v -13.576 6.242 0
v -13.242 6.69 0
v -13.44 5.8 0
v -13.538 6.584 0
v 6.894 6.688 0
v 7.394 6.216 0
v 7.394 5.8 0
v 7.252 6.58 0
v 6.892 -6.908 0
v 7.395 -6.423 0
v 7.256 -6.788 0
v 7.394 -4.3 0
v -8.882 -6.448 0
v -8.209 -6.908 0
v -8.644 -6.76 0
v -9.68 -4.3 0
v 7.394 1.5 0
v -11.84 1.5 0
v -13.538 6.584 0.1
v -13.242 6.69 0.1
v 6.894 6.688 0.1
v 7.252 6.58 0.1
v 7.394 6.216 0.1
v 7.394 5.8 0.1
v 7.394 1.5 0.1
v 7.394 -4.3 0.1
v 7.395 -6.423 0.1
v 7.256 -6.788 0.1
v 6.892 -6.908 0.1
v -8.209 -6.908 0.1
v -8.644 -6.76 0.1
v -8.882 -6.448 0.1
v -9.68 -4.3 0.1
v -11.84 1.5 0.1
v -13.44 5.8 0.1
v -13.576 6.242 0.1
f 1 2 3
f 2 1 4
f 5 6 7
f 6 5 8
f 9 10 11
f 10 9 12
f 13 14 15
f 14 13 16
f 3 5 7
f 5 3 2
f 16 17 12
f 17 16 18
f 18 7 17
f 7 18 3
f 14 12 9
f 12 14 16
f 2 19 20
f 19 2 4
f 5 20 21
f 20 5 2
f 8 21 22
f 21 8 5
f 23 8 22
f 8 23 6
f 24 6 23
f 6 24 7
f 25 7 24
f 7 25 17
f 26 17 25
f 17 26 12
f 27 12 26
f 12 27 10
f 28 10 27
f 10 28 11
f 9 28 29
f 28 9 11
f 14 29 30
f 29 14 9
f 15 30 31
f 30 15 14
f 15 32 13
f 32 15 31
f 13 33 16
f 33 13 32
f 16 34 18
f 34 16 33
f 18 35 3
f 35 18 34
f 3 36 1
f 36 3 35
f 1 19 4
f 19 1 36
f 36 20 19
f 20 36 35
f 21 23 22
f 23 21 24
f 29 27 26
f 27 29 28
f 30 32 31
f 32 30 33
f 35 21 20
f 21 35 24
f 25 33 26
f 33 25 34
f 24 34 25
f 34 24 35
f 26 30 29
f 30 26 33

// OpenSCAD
// file: ../p/4-4edge.scad
use <../lib.scad>
$fa=1; $fs=0.2;
function ldraw_lib__4_4edge(realsolid=false) = [
// 0 Circle 1.0
// 0 Name: 4-4edge.dat
// 0 Author: James Jessiman
// 0 !LDRAW_ORG Primitive UPDATE 2017-01
// 0 !LICENSE Licensed under CC BY 2.0 and CC BY 4.0 : see CAreadme.txt
// 
// 0 BFC CERTIFY CCW
  [0,"BFC","CERTIFY"],
  [0,"BFC","CCW"],
// 
// 0 !HISTORY 1998-12-15 [PTadmin] Official Update 1998-10
// 0 !HISTORY 2005-12-28 [PTadmin] Official Update 2005-01
// 0 !HISTORY 2007-06-24 [PTadmin] Header formatted for Contributor Agreement
// 0 !HISTORY 2008-07-01 [PTadmin] Official Update 2008-01
// 0 !HISTORY 2017-01-15 [Steffen] BFCed
// 0 !HISTORY 2017-12-30 [PTadmin] Official Update 2017-01
// 
// 
// 2 24 1 0 0 0.9239 0 0.3827
  [2,24,1,0,0,0.9239,0,0.3827],
// 2 24 0.9239 0 0.3827 0.7071 0 0.7071
  [2,24,0.9239,0,0.3827,0.7071,0,0.7071],
// 2 24 0.7071 0 0.7071 0.3827 0 0.9239
  [2,24,0.7071,0,0.7071,0.3827,0,0.9239],
// 2 24 0.3827 0 0.9239 0 0 1
  [2,24,0.3827,0,0.9239,0,0,1],
// 2 24 0 0 1 -0.3827 0 0.9239
  [2,24,0,0,1,-0.3827,0,0.9239],
// 2 24 -0.3827 0 0.9239 -0.7071 0 0.7071
  [2,24,-0.3827,0,0.9239,-0.7071,0,0.7071],
// 2 24 -0.7071 0 0.7071 -0.9239 0 0.3827
  [2,24,-0.7071,0,0.7071,-0.9239,0,0.3827],
// 2 24 -0.9239 0 0.3827 -1 0 -0
  [2,24,-0.9239,0,0.3827,-1,0,-0],
// 2 24 -1 0 -0 -0.9239 0 -0.3827
  [2,24,-1,0,-0,-0.9239,0,-0.3827],
// 2 24 -0.9239 0 -0.3827 -0.7071 0 -0.7071
  [2,24,-0.9239,0,-0.3827,-0.7071,0,-0.7071],
// 2 24 -0.7071 0 -0.7071 -0.3827 0 -0.9239
  [2,24,-0.7071,0,-0.7071,-0.3827,0,-0.9239],
// 2 24 -0.3827 0 -0.9239 0 0 -1
  [2,24,-0.3827,0,-0.9239,0,0,-1],
// 2 24 0 0 -1 0.3827 0 -0.9239
  [2,24,0,0,-1,0.3827,0,-0.9239],
// 2 24 0.3827 0 -0.9239 0.7071 0 -0.7071
  [2,24,0.3827,0,-0.9239,0.7071,0,-0.7071],
// 2 24 0.7071 0 -0.7071 0.9239 0 -0.3827
  [2,24,0.7071,0,-0.7071,0.9239,0,-0.3827],
// 2 24 0.9239 0 -0.3827 1 0 0
  [2,24,0.9239,0,-0.3827,1,0,0],
];
module ldraw_lib__4_4edge(step=0, col=false, unit=2/5, alt=false, line=0.2, solid=!$preview)
    makepoly(ldraw_lib__4_4edge(solid), step=step, col=col, unit=unit, alt=alt, line=line, solid=solid);
ldraw_lib__4_4edge(line=0.2);
// file: ../p/4-4disc.scad
use <../lib.scad>
$fa=1; $fs=0.2;
function ldraw_lib__4_4disc(realsolid=false) = [
// 0 Disc 1.0
// 0 Name: 4-4disc.dat
// 0 Author: James Jessiman
// 0 !LDRAW_ORG Primitive UPDATE 2002-02
// 0 !LICENSE Licensed under CC BY 2.0 and CC BY 4.0 : see CAreadme.txt
// 
// 0 BFC CERTIFY CCW
  [0,"BFC","CERTIFY"],
  [0,"BFC","CCW"],
// 
// 0 !HISTORY 1998-12-15 [PTadmin] Official Update 1998-10
// 0 !HISTORY 2002-03-23 [sbliss] Added BFC statement
// 0 !HISTORY 2002-04-25 [PTadmin] Official Update 2002-02
// 0 !HISTORY 2007-06-24 [PTadmin] Header formatted for Contributor Agreement
// 0 !HISTORY 2008-07-01 [PTadmin] Official Update 2008-01
// 
// 
// 3 16 0 0 0 1 0 0 0.9239 0 0.3827
  [3,16,0,0,0,1,0,0,0.9239,0,0.3827],
// 3 16 0 0 0 0.9239 0 0.3827 0.7071 0 0.7071
  [3,16,0,0,0,0.9239,0,0.3827,0.7071,0,0.7071],
// 3 16 0 0 0 0.7071 0 0.7071 0.3827 0 0.9239
  [3,16,0,0,0,0.7071,0,0.7071,0.3827,0,0.9239],
// 3 16 0 0 0 0.3827 0 0.9239 0 0 1
  [3,16,0,0,0,0.3827,0,0.9239,0,0,1],
// 3 16 0 0 0 0 0 1 -0.3827 0 0.9239
  [3,16,0,0,0,0,0,1,-0.3827,0,0.9239],
// 3 16 0 0 0 -0.3827 0 0.9239 -0.7071 0 0.7071
  [3,16,0,0,0,-0.3827,0,0.9239,-0.7071,0,0.7071],
// 3 16 0 0 0 -0.7071 0 0.7071 -0.9239 0 0.3827
  [3,16,0,0,0,-0.7071,0,0.7071,-0.9239,0,0.3827],
// 3 16 0 0 0 -0.9239 0 0.3827 -1 0 -0
  [3,16,0,0,0,-0.9239,0,0.3827,-1,0,-0],
// 3 16 0 0 0 -1 0 -0 -0.9239 0 -0.3827
  [3,16,0,0,0,-1,0,-0,-0.9239,0,-0.3827],
// 3 16 0 0 0 -0.9239 0 -0.3827 -0.7071 0 -0.7071
  [3,16,0,0,0,-0.9239,0,-0.3827,-0.7071,0,-0.7071],
// 3 16 0 0 0 -0.7071 0 -0.7071 -0.3827 0 -0.9239
  [3,16,0,0,0,-0.7071,0,-0.7071,-0.3827,0,-0.9239],
// 3 16 0 0 0 -0.3827 0 -0.9239 0 0 -1
  [3,16,0,0,0,-0.3827,0,-0.9239,0,0,-1],
// 3 16 0 0 0 0 0 -1 0.3827 0 -0.9239
  [3,16,0,0,0,0,0,-1,0.3827,0,-0.9239],
// 3 16 0 0 0 0.3827 0 -0.9239 0.7071 0 -0.7071
  [3,16,0,0,0,0.3827,0,-0.9239,0.7071,0,-0.7071],
// 3 16 0 0 0 0.7071 0 -0.7071 0.9239 0 -0.3827
  [3,16,0,0,0,0.7071,0,-0.7071,0.9239,0,-0.3827],
// 3 16 0 0 0 0.9239 0 -0.3827 1 0 0
  [3,16,0,0,0,0.9239,0,-0.3827,1,0,0],
// 0
];
module ldraw_lib__4_4disc(step=0, col=false, unit=2/5, alt=false, line=0.2, solid=!$preview)
    makepoly(ldraw_lib__4_4disc(solid), step=step, col=col, unit=unit, alt=alt, line=line, solid=solid);
ldraw_lib__4_4disc(line=0.2);
// file: ../p/4-4cyli.scad
use <../lib.scad>
$fa=1; $fs=0.2;
function ldraw_lib__4_4cyli(realsolid=false) = [
// 0 Cylinder 1.0
// 0 Name: 4-4cyli.dat
// 0 Author: James Jessiman
// 0 !LDRAW_ORG Primitive UPDATE 2005-01
// 0 !LICENSE Licensed under CC BY 2.0 and CC BY 4.0 : see CAreadme.txt
// 
// 0 BFC CERTIFY CCW
  [0,"BFC","CERTIFY"],
  [0,"BFC","CCW"],
// 
// 0 !HISTORY 1998-12-15 [PTadmin] Official Update 1998-10
// 0 !HISTORY 2002-03-23 [sbliss] Added BFC statement; merged headers from files in distributions LDraw 0.27 and Complete.
// 0 !HISTORY 2002-04-25 [PTadmin] Official Update 2002-02
// 0 !HISTORY 2004-12-14 [guyvivan] BFC CCW
// 0 !HISTORY 2005-12-28 [PTadmin] Official Update 2005-01
// 0 !HISTORY 2007-06-24 [PTadmin] Header formatted for Contributor Agreement
// 0 !HISTORY 2008-07-01 [PTadmin] Official Update 2008-01
// 
// 
// 4 16 1 1 0 0.9239 1 0.3827 0.9239 0 0.3827 1 0 0
  [4,16,1,1,0,0.9239,1,0.3827,0.9239,0,0.3827,1,0,0],
// 5 24 1 0 0 1 1 0 0.9239 0 0.3827 0.9239 0 -0.3827
  [5,24,1,0,0,1,1,0,0.9239,0,0.3827,0.9239,0,-0.3827],
// 4 16 0.9239 1 0.3827 0.7071 1 0.7071 0.7071 0 0.7071 0.9239 0 0.3827
  [4,16,0.9239,1,0.3827,0.7071,1,0.7071,0.7071,0,0.7071,0.9239,0,0.3827],
// 5 24 0.9239 0 0.3827 0.9239 1 0.3827 0.7071 0 0.7071 1 0 0
  [5,24,0.9239,0,0.3827,0.9239,1,0.3827,0.7071,0,0.7071,1,0,0],
// 4 16 0.7071 1 0.7071 0.3827 1 0.9239 0.3827 0 0.9239 0.7071 0 0.7071
  [4,16,0.7071,1,0.7071,0.3827,1,0.9239,0.3827,0,0.9239,0.7071,0,0.7071],
// 5 24 0.7071 0 0.7071 0.7071 1 0.7071 0.3827 0 0.9239 0.9239 0 0.3827
  [5,24,0.7071,0,0.7071,0.7071,1,0.7071,0.3827,0,0.9239,0.9239,0,0.3827],
// 4 16 0.3827 1 0.9239 0 1 1 0 0 1 0.3827 0 0.9239
  [4,16,0.3827,1,0.9239,0,1,1,0,0,1,0.3827,0,0.9239],
// 5 24 0.3827 0 0.9239 0.3827 1 0.9239 0 0 1 0.7071 0 0.7071
  [5,24,0.3827,0,0.9239,0.3827,1,0.9239,0,0,1,0.7071,0,0.7071],
// 4 16 0 1 1 -0.3827 1 0.9239 -0.3827 0 0.9239 0 0 1
  [4,16,0,1,1,-0.3827,1,0.9239,-0.3827,0,0.9239,0,0,1],
// 5 24 0 0 1 0 1 1 -0.3827 0 0.9239 0.3827 0 0.9239
  [5,24,0,0,1,0,1,1,-0.3827,0,0.9239,0.3827,0,0.9239],
// 4 16 -0.3827 1 0.9239 -0.7071 1 0.7071 -0.7071 0 0.7071 -0.3827 0 0.9239
  [4,16,-0.3827,1,0.9239,-0.7071,1,0.7071,-0.7071,0,0.7071,-0.3827,0,0.9239],
// 5 24 -0.3827 0 0.9239 -0.3827 1 0.9239 -0.7071 0 0.7071 0 0 1
  [5,24,-0.3827,0,0.9239,-0.3827,1,0.9239,-0.7071,0,0.7071,0,0,1],
// 4 16 -0.7071 1 0.7071 -0.9239 1 0.3827 -0.9239 0 0.3827 -0.7071 0 0.7071
  [4,16,-0.7071,1,0.7071,-0.9239,1,0.3827,-0.9239,0,0.3827,-0.7071,0,0.7071],
// 5 24 -0.7071 0 0.7071 -0.7071 1 0.7071 -0.9239 0 0.3827 -0.3827 0 0.9239
  [5,24,-0.7071,0,0.7071,-0.7071,1,0.7071,-0.9239,0,0.3827,-0.3827,0,0.9239],
// 4 16 -0.9239 1 0.3827 -1 1 0 -1 0 0 -0.9239 0 0.3827
  [4,16,-0.9239,1,0.3827,-1,1,0,-1,0,0,-0.9239,0,0.3827],
// 5 24 -0.9239 0 0.3827 -0.9239 1 0.3827 -1 0 0 -0.7071 0 0.7071
  [5,24,-0.9239,0,0.3827,-0.9239,1,0.3827,-1,0,0,-0.7071,0,0.7071],
// 4 16 -1 1 0 -0.9239 1 -0.3827 -0.9239 0 -0.3827 -1 0 0
  [4,16,-1,1,0,-0.9239,1,-0.3827,-0.9239,0,-0.3827,-1,0,0],
// 5 24 -1 0 0 -1 1 0 -0.9239 0 -0.3827 -0.9239 0 0.3827
  [5,24,-1,0,0,-1,1,0,-0.9239,0,-0.3827,-0.9239,0,0.3827],
// 4 16 -0.9239 1 -0.3827 -0.7071 1 -0.7071 -0.7071 0 -0.7071 -0.9239 0 -0.3827
  [4,16,-0.9239,1,-0.3827,-0.7071,1,-0.7071,-0.7071,0,-0.7071,-0.9239,0,-0.3827],
// 5 24 -0.9239 0 -0.3827 -0.9239 1 -0.3827 -0.7071 0 -0.7071 -1 0 0
  [5,24,-0.9239,0,-0.3827,-0.9239,1,-0.3827,-0.7071,0,-0.7071,-1,0,0],
// 4 16 -0.7071 1 -0.7071 -0.3827 1 -0.9239 -0.3827 0 -0.9239 -0.7071 0 -0.7071
  [4,16,-0.7071,1,-0.7071,-0.3827,1,-0.9239,-0.3827,0,-0.9239,-0.7071,0,-0.7071],
// 5 24 -0.7071 0 -0.7071 -0.7071 1 -0.7071 -0.3827 0 -0.9239 -0.9239 0 -0.3827
  [5,24,-0.7071,0,-0.7071,-0.7071,1,-0.7071,-0.3827,0,-0.9239,-0.9239,0,-0.3827],
// 4 16 -0.3827 1 -0.9239 0 1 -1 0 0 -1 -0.3827 0 -0.9239
  [4,16,-0.3827,1,-0.9239,0,1,-1,0,0,-1,-0.3827,0,-0.9239],
// 5 24 -0.3827 0 -0.9239 -0.3827 1 -0.9239 0 0 -1 -0.7071 0 -0.7071
  [5,24,-0.3827,0,-0.9239,-0.3827,1,-0.9239,0,0,-1,-0.7071,0,-0.7071],
// 4 16 0 1 -1 0.3827 1 -0.9239 0.3827 0 -0.9239 0 0 -1
  [4,16,0,1,-1,0.3827,1,-0.9239,0.3827,0,-0.9239,0,0,-1],
// 5 24 0 0 -1 0 1 -1 0.3827 0 -0.9239 -0.3827 0 -0.9239
  [5,24,0,0,-1,0,1,-1,0.3827,0,-0.9239,-0.3827,0,-0.9239],
// 4 16 0.3827 1 -0.9239 0.7071 1 -0.7071 0.7071 0 -0.7071 0.3827 0 -0.9239
  [4,16,0.3827,1,-0.9239,0.7071,1,-0.7071,0.7071,0,-0.7071,0.3827,0,-0.9239],
// 5 24 0.3827 0 -0.9239 0.3827 1 -0.9239 0.7071 0 -0.7071 0 0 -1
  [5,24,0.3827,0,-0.9239,0.3827,1,-0.9239,0.7071,0,-0.7071,0,0,-1],
// 4 16 0.7071 1 -0.7071 0.9239 1 -0.3827 0.9239 0 -0.3827 0.7071 0 -0.7071
  [4,16,0.7071,1,-0.7071,0.9239,1,-0.3827,0.9239,0,-0.3827,0.7071,0,-0.7071],
// 5 24 0.7071 0 -0.7071 0.7071 1 -0.7071 0.9239 0 -0.3827 0.3827 0 -0.9239
  [5,24,0.7071,0,-0.7071,0.7071,1,-0.7071,0.9239,0,-0.3827,0.3827,0,-0.9239],
// 4 16 0.9239 1 -0.3827 1 1 0 1 0 0 0.9239 0 -0.3827
  [4,16,0.9239,1,-0.3827,1,1,0,1,0,0,0.9239,0,-0.3827],
// 5 24 0.9239 0 -0.3827 0.9239 1 -0.3827 1 0 0 0.7071 0 -0.7071
  [5,24,0.9239,0,-0.3827,0.9239,1,-0.3827,1,0,0,0.7071,0,-0.7071],
// 0
];
module ldraw_lib__4_4cyli(step=0, col=false, unit=2/5, alt=false, line=0.2, solid=!$preview)
    makepoly(ldraw_lib__4_4cyli(solid), step=step, col=col, unit=unit, alt=alt, line=line, solid=solid);
ldraw_lib__4_4cyli(line=0.2);
// file: ../p/stud3.scad
use <../lib.scad>
use <4-4cyli.scad>
use <4-4disc.scad>
use <4-4edge.scad>
$fa=1; $fs=0.2;
function ldraw_lib__stud3(realsolid=false) = realsolid ? 
    [openscad(translate([0,0,-eps()], o=cylinder(4+eps(), r=4)),2)] : [
// 0 Stud Tube Solid
// 0 Name: stud3.dat
// 0 Author: James Jessiman
// 0 !LDRAW_ORG Primitive UPDATE 2012-01
// 0 !LICENSE Licensed under CC BY 2.0 and CC BY 4.0 : see CAreadme.txt
// 
// 0 BFC CERTIFY CCW
  [0,"BFC","CERTIFY"],
  [0,"BFC","CCW"],
// 
// 0 !HISTORY 2002-04-04 [sbliss] Modified for BFC compliance
// 0 !HISTORY 2002-04-25 [PTadmin] Official Update 2002-02
// 0 !HISTORY 2007-06-24 [PTadmin] Header formatted for Contributor Agreement
// 0 !HISTORY 2008-07-01 [PTadmin] Official Update 2008-01
// 0 !HISTORY 2012-02-16 [Philo] Changed to CCW
// 0 !HISTORY 2012-03-30 [PTadmin] Official Update 2012-01
// 
// 
// 1 16 0 -4 0 4 0 0 0 1 0 0 0 4 4-4edge.dat
  [1,16,0,-4,0,4,0,0,0,1,0,0,0,4, ldraw_lib__4_4edge(realsolid)],
// 1 16 0 0 0 4 0 0 0 1 0 0 0 4 4-4edge.dat
  [1,16,0,0,0,4,0,0,0,1,0,0,0,4, ldraw_lib__4_4edge(realsolid)],
// 1 16 0 -4 0 4 0 0 0 1 0 0 0 4 4-4disc.dat
  [1,16,0,-4,0,4,0,0,0,1,0,0,0,4, ldraw_lib__4_4disc(realsolid)],
// 1 16 0 -4 0 4 0 0 0 4 0 0 0 4 4-4cyli.dat
  [1,16,0,-4,0,4,0,0,0,4,0,0,0,4, ldraw_lib__4_4cyli(realsolid)],
];
module ldraw_lib__stud3(step=0, col=false, unit=2/5, alt=false, line=0.2, solid=!$preview)
    makepoly(ldraw_lib__stud3(solid), step=step, col=col, unit=unit, alt=alt, line=line, solid=solid);
ldraw_lib__stud3(line=0.2);
// file: ../p/stud.scad
use <../lib.scad>
use <4-4cyli.scad>
use <4-4disc.scad>
use <4-4edge.scad>
$fa=1; $fs=0.2;
function ldraw_lib__stud(realsolid=false) = realsolid ? 
    [openscad(translate([0,0,-eps()], o=cylinder(4+eps(), r=6)),2)] : [
// 0 Stud
// 0 Name: stud.dat
// 0 Author: James Jessiman
// 0 !LDRAW_ORG Primitive UPDATE 2012-01
// 0 !LICENSE Licensed under CC BY 2.0 and CC BY 4.0 : see CAreadme.txt
// 
// 0 BFC CERTIFY CCW
  [0,"BFC","CERTIFY"],
  [0,"BFC","CCW"],
// 
// 0 !HISTORY 2002-04-04 [sbliss] Modified for BFC compliance
// 0 !HISTORY 2002-04-25 [PTadmin] Official Update 2002-02
// 0 !HISTORY 2007-06-24 [PTadmin] Header formatted for Contributor Agreement
// 0 !HISTORY 2008-07-01 [PTadmin] Official Update 2008-01
// 0 !HISTORY 2012-02-16 [Philo] Changed to CCW
// 0 !HISTORY 2012-03-30 [PTadmin] Official Update 2012-01
// 
// 
// 1 16 0 0 0 6 0 0 0 1 0 0 0 6 4-4edge.dat
  [1,16,0,0,0,6,0,0,0,1,0,0,0,6, ldraw_lib__4_4edge(realsolid)],
// 1 16 0 -4 0 6 0 0 0 1 0 0 0 6 4-4edge.dat
  [1,16,0,-4,0,6,0,0,0,1,0,0,0,6, ldraw_lib__4_4edge(realsolid)],
// 1 16 0 0 0 6 0 0 0 -4 0 0 0 6 4-4cyli.dat
  [1,16,0,0,0,6,0,0,0,-4,0,0,0,6, ldraw_lib__4_4cyli(realsolid)],
// 1 16 0 -4 0 6 0 0 0 1 0 0 0 6 4-4disc.dat
  [1,16,0,-4,0,6,0,0,0,1,0,0,0,6, ldraw_lib__4_4disc(realsolid)],
];
module ldraw_lib__stud(step=0, col=false, unit=2/5, alt=false, line=0.2, solid=!$preview)
    makepoly(ldraw_lib__stud(solid), step=step, col=col, unit=unit, alt=alt, line=line, solid=solid);
ldraw_lib__stud(line=0.2);
// file: ../p/box5.scad
use <../lib.scad>
$fa=1; $fs=0.2;
function ldraw_lib__box5(realsolid=false) = [
// 0 Box with 5 Faces and All Edges
// 0 Name: box5.dat
// 0 Author: James Jessiman
// 0 !LDRAW_ORG Primitive UPDATE 2012-01
// 0 !LICENSE Licensed under CC BY 2.0 and CC BY 4.0 : see CAreadme.txt
// 
// 0 BFC CERTIFY CCW
  [0,"BFC","CERTIFY"],
  [0,"BFC","CCW"],
// 
// 0 !HISTORY 2002-04-03 [sbliss] Modified for BFC compliance
// 0 !HISTORY 2002-04-25 [PTadmin] Official Update 2002-02
// 0 !HISTORY 2007-06-24 [PTadmin] Header formatted for Contributor Agreement
// 0 !HISTORY 2008-07-01 [PTadmin] Official Update 2008-01
// 0 !HISTORY 2012-02-16 [Philo] Changed to CCW
// 0 !HISTORY 2012-03-30 [PTadmin] Official Update 2012-01
// 
// 
// 2 24 1 1 1 -1 1 1
  [2,24,1,1,1,-1,1,1],
// 2 24 -1 1 1 -1 1 -1
  [2,24,-1,1,1,-1,1,-1],
// 2 24 -1 1 -1 1 1 -1
  [2,24,-1,1,-1,1,1,-1],
// 2 24 1 1 -1 1 1 1
  [2,24,1,1,-1,1,1,1],
// 2 24 1 0 1 -1 0 1
  [2,24,1,0,1,-1,0,1],
// 2 24 -1 0 1 -1 0 -1
  [2,24,-1,0,1,-1,0,-1],
// 2 24 -1 0 -1 1 0 -1
  [2,24,-1,0,-1,1,0,-1],
// 2 24 1 0 -1 1 0 1
  [2,24,1,0,-1,1,0,1],
// 2 24 1 0 1 1 1 1
  [2,24,1,0,1,1,1,1],
// 2 24 -1 0 1 -1 1 1
  [2,24,-1,0,1,-1,1,1],
// 2 24 1 0 -1 1 1 -1
  [2,24,1,0,-1,1,1,-1],
// 2 24 -1 0 -1 -1 1 -1
  [2,24,-1,0,-1,-1,1,-1],
// 4 16 -1 1 1 1 1 1 1 1 -1 -1 1 -1
  [4,16,-1,1,1,1,1,1,1,1,-1,-1,1,-1],
// 4 16 -1 1 1 -1 0 1 1 0 1 1 1 1
  [4,16,-1,1,1,-1,0,1,1,0,1,1,1,1],
// 4 16 -1 1 -1 -1 0 -1 -1 0 1 -1 1 1
  [4,16,-1,1,-1,-1,0,-1,-1,0,1,-1,1,1],
// 4 16 1 1 -1 1 0 -1 -1 0 -1 -1 1 -1
  [4,16,1,1,-1,1,0,-1,-1,0,-1,-1,1,-1],
// 4 16 1 1 1 1 0 1 1 0 -1 1 1 -1
  [4,16,1,1,1,1,0,1,1,0,-1,1,1,-1],
];
module ldraw_lib__box5(step=0, col=false, unit=2/5, alt=false, line=0.2, solid=!$preview)
    makepoly(ldraw_lib__box5(solid), step=step, col=col, unit=unit, alt=alt, line=line, solid=solid);
ldraw_lib__box5(line=0.2);
// file: ../p/box4t.scad
use <../lib.scad>
$fa=1; $fs=0.2;
function ldraw_lib__box4t(realsolid=false) = [
// 0 Box with 4 Adjacent Faces and All Edges
// 0 Name: box4t.dat
// 0 Author: Tore Eriksson [Tore_Eriksson]
// 0 !LDRAW_ORG Primitive UPDATE 2003-02
// 0 !LICENSE Licensed under CC BY 2.0 and CC BY 4.0 : see CAreadme.txt
// 
// 0 BFC CERTIFY CCW
  [0,"BFC","CERTIFY"],
  [0,"BFC","CCW"],
// 
// 0 !HISTORY 1997-09-29 [PTadmin] Official Update 1997-15
// 0 !HISTORY 2002-08-31 [izanette] Modified with WINDZ for BFC compliance
// 0 !HISTORY 2003-08-01 [PTadmin] Official Update 2003-02
// 0 !HISTORY 2007-06-24 [PTadmin] Header formatted for Contributor Agreement
// 0 !HISTORY 2008-07-01 [PTadmin] Official Update 2008-01
// 
// 
// 2 24 1 1 1 -1 1 1
  [2,24,1,1,1,-1,1,1],
// 2 24 -1 1 1 -1 1 -1
  [2,24,-1,1,1,-1,1,-1],
// 2 24 -1 1 -1 1 1 -1
  [2,24,-1,1,-1,1,1,-1],
// 2 24 1 1 -1 1 1 1
  [2,24,1,1,-1,1,1,1],
// 2 24 1 0 1 -1 0 1
  [2,24,1,0,1,-1,0,1],
// 2 24 -1 0 1 -1 0 -1
  [2,24,-1,0,1,-1,0,-1],
// 2 24 -1 0 -1 1 0 -1
  [2,24,-1,0,-1,1,0,-1],
// 2 24 1 0 -1 1 0 1
  [2,24,1,0,-1,1,0,1],
// 2 24 1 0 1 1 1 1
  [2,24,1,0,1,1,1,1],
// 2 24 -1 0 1 -1 1 1
  [2,24,-1,0,1,-1,1,1],
// 2 24 1 0 -1 1 1 -1
  [2,24,1,0,-1,1,1,-1],
// 2 24 -1 0 -1 -1 1 -1
  [2,24,-1,0,-1,-1,1,-1],
// 4 16 1 1 1 1 1 -1 -1 1 -1 -1 1 1
  [4,16,1,1,1,1,1,-1,-1,1,-1,-1,1,1],
// 4 16 1 1 1 -1 1 1 -1 0 1 1 0 1
  [4,16,1,1,1,-1,1,1,-1,0,1,1,0,1],
// 4 16 -1 1 1 -1 1 -1 -1 0 -1 -1 0 1
  [4,16,-1,1,1,-1,1,-1,-1,0,-1,-1,0,1],
// 0 4 16 -1 1 -1 -1 0 -1 1 0 -1 1 1 -1
// 4 16 1 1 -1 1 1 1 1 0 1 1 0 -1
  [4,16,1,1,-1,1,1,1,1,0,1,1,0,-1],
// 0
];
module ldraw_lib__box4t(step=0, col=false, unit=2/5, alt=false, line=0.2, solid=!$preview)
    makepoly(ldraw_lib__box4t(solid), step=step, col=col, unit=unit, alt=alt, line=line, solid=solid);
ldraw_lib__box4t(line=0.2);
// file: s/3004s01.scad
use <../../lib.scad>
use <../../p/box4t.scad>
use <../../p/box5.scad>
use <../../p/stud.scad>
use <../../p/stud3.scad>
$fa=1; $fs=0.2;
function ldraw_lib__s__3004s01(realsolid=false) = [
// 0 ~Brick  1 x  2 without Front Face
// 0 Name: s\3004s01.dat
// 0 Author: James Jessiman
// 0 !LDRAW_ORG Subpart UPDATE 2003-03
// 0 !LICENSE Licensed under CC BY 2.0 and CC BY 4.0 : see CAreadme.txt
// 
// 0 BFC CERTIFY CCW
  [0,"BFC","CERTIFY"],
  [0,"BFC","CCW"],
// 
// 0 !HISTORY 2003-09-07 [jriley] Subfiling, BFC
// 0 !HISTORY 2003-12-19 [PTadmin] Official Update 2003-03
// 0 !HISTORY 2007-08-29 [PTadmin] Header formatted for Contributor Agreement
// 0 !HISTORY 2008-07-01 [PTadmin] Official Update 2008-01
// 
// 
// 1 16 0 4 0 1 0 0 0 -5 0 0 0 1 stud3.dat
  [1,16,0,4,0,1,0,0,0,-5,0,0,0,1, ldraw_lib__stud3(realsolid)],
// 0 BFC INVERTNEXT
  [0,"BFC","INVERTNEXT"],
// 1 16 0 24 0 16 0 0 0 -20 0 0 0 6 box5.dat
  [1,16,0,24,0,16,0,0,0,-20,0,0,0,6, ldraw_lib__box5(realsolid)],
// 4 16 20 24 10 16 24 6 -16 24 6 -20 24 10
  [4,16,20,24,10,16,24,6,-16,24,6,-20,24,10],
// 4 16 -20 24 10 -16 24 6 -16 24 -6 -20 24 -10
  [4,16,-20,24,10,-16,24,6,-16,24,-6,-20,24,-10],
// 4 16 -20 24 -10 -16 24 -6 16 24 -6 20 24 -10
  [4,16,-20,24,-10,-16,24,-6,16,24,-6,20,24,-10],
// 4 16 20 24 -10 16 24 -6 16 24 6 20 24 10
  [4,16,20,24,-10,16,24,-6,16,24,6,20,24,10],
// 1 16 0 24 0 20 0 0 0 -24 0 0 0 10 box4t.dat
  [1,16,0,24,0,20,0,0,0,-24,0,0,0,10, ldraw_lib__box4t(realsolid)],
// 1 16 10 0 0 1 0 0 0 1 0 0 0 1 stud.dat
  [1,16,10,0,0,1,0,0,0,1,0,0,0,1, ldraw_lib__stud(realsolid)],
// 1 16 -10 0 0 1 0 0 0 1 0 0 0 1 stud.dat
  [1,16,-10,0,0,1,0,0,0,1,0,0,0,1, ldraw_lib__stud(realsolid)],
// 0
];
module ldraw_lib__s__3004s01(step=0, col=false, unit=2/5, alt=false, line=0.2, solid=!$preview)
    makepoly(ldraw_lib__s__3004s01(solid), step=step, col=col, unit=unit, alt=alt, line=line, solid=solid);
ldraw_lib__s__3004s01(line=0.2);
// file: 3004.scad
use <../lib.scad>
use <s/3004s01.scad>
$fa=1; $fs=0.2;
function ldraw_lib__3004(realsolid=false) = [
// 0 Brick  1 x  2
// 0 Name: 3004.dat
// 0 Author: James Jessiman
// 0 !LDRAW_ORG Part UPDATE 2022-05
// 0 !LICENSE Licensed under CC BY 2.0 and CC BY 4.0 : see CAreadme.txt
// 
// 0 BFC CERTIFY CCW
  [0,"BFC","CERTIFY"],
  [0,"BFC","CCW"],
// 
// 0 !HISTORY 2001-10-26 [PTadmin] Official Update 2001-01
// 0 !HISTORY 2002-05-07 {unknown} BFC Certification
// 0 !HISTORY 2002-06-11 [PTadmin] Official Update 2002-03
// 0 !HISTORY 2007-05-07 [PTadmin] Header formatted for Contributor Agreement
// 0 !HISTORY 2008-07-01 [PTadmin] Official Update 2008-01
// 0 !HISTORY 2022-08-04 [MagFors] Using subfile
// 0 !HISTORY 2022-09-15 [PTadmin] Official Update 2022-05
// 
// 
// 1 16 0 0 0 1 0 0 0 1 0 0 0 1 s\3004s01.dat
  [1,16,0,0,0,1,0,0,0,1,0,0,0,1, ldraw_lib__s__3004s01(realsolid)],
// 4 16 -20 24 -10 20 24 -10 20 0 -10 -20 0 -10
  [4,16,-20,24,-10,20,24,-10,20,0,-10,-20,0,-10],
];
module ldraw_lib__3004(step=0, col=false, unit=2/5, alt=false, line=0.2, solid=!$preview)
    makepoly(ldraw_lib__3004(solid), step=step, col=col, unit=unit, alt=alt, line=line, solid=solid);
ldraw_lib__3004(line=0.2);
// file: s/13710ks02.scad
use <../../lib.scad>
$fa=1; $fs=0.2;
function ldraw_lib__s__13710ks02(realsolid=false) = [
// 0 ~Sticker Top for Technic Beam  3 with Panel Fairing (Flat)
// 0 Name: s\13710ks02.dat
// 0 Author: Philippe Hurbain [Philo]
// 0 !LDRAW_ORG Subpart UPDATE 2022-02
// 0 !LICENSE Licensed under CC BY 2.0 and CC BY 4.0 : see CAreadme.txt
// 
// 0 BFC CERTIFY CCW
  [0,"BFC","CERTIFY"],
  [0,"BFC","CCW"],
// 
// 0 !HISTORY 2022-03-06 [PTadmin] Official Update 2022-02
// 
// 
// 0 // Top surface
// 
// 4 16 33.94 -0.25 15.604 33.845 -0.25 16.459 33.105 -0.25 16.725 33.6 -0.25 14.5
  [4,16,33.94,-0.25,15.604,33.845,-0.25,16.459,33.105,-0.25,16.725,33.6,-0.25,14.5],
// 4 16 -17.236 -0.25 16.721 -18.13 -0.25 16.45 -18.484 -0.25 15.539 -18.484 -0.25 14.5
  [4,16,-17.236,-0.25,16.721,-18.13,-0.25,16.45,-18.484,-0.25,15.539,-18.484,-0.25,14.5],
// 4 16 -18.487 -0.25 -16.058 -18.14 -0.25 -16.971 -17.23 -0.25 -17.27 -18.484 -0.25 -10.75
  [4,16,-18.487,-0.25,-16.058,-18.14,-0.25,-16.971,-17.23,-0.25,-17.27,-18.484,-0.25,-10.75],
// 4 16 20.522 -0.25 -17.269 21.61 -0.25 -16.899 22.205 -0.25 -16.121 24.2 -0.25 -10.75
  [4,16,20.522,-0.25,-17.269,21.61,-0.25,-16.899,22.205,-0.25,-16.121,24.2,-0.25,-10.75],
// 4 16 33.6 -0.25 14.5 33.105 -0.25 16.725 -17.236 -0.25 16.721 -18.484 -0.25 14.5
  [4,16,33.6,-0.25,14.5,33.105,-0.25,16.725,-17.236,-0.25,16.721,-18.484,-0.25,14.5],
// 4 16 -18.484 -0.25 -10.75 24.2 -0.25 -10.75 29.6 -0.25 3.75 -18.484 -0.25 3.75
  [4,16,-18.484,-0.25,-10.75,24.2,-0.25,-10.75,29.6,-0.25,3.75,-18.484,-0.25,3.75],
// 4 16 33.6 -0.25 14.5 -18.484 -0.25 14.5 -18.484 -0.25 3.75 29.6 -0.25 3.75
  [4,16,33.6,-0.25,14.5,-18.484,-0.25,14.5,-18.484,-0.25,3.75,29.6,-0.25,3.75],
// 4 16 24.2 -0.25 -10.75 -18.484 -0.25 -10.75 -17.23 -0.25 -17.27 20.522 -0.25 -17.269
  [4,16,24.2,-0.25,-10.75,-18.484,-0.25,-10.75,-17.23,-0.25,-17.27,20.522,-0.25,-17.269],
];
module ldraw_lib__s__13710ks02(step=0, col=false, unit=2/5, alt=false, line=0.2, solid=!$preview)
    makepoly(ldraw_lib__s__13710ks02(solid), step=step, col=col, unit=unit, alt=alt, line=line, solid=solid);
ldraw_lib__s__13710ks02(line=0.2);
// file: s/13710ks01.scad
use <../../lib.scad>
use <13710ks02.scad>
$fa=1; $fs=0.2;
function ldraw_lib__s__13710ks01(realsolid=false) = [
// 0 ~Sticker Bottom for Technic Beam  3 with Panel Fairing (Flat)
// 0 Name: s\13710ks01.dat
// 0 Author: Philippe Hurbain [Philo]
// 0 !LDRAW_ORG Subpart UPDATE 2022-02
// 0 !LICENSE Licensed under CC BY 2.0 and CC BY 4.0 : see CAreadme.txt
// 
// 0 BFC CERTIFY CCW
  [0,"BFC","CERTIFY"],
  [0,"BFC","CCW"],
// 
// 0 !HISTORY 2022-03-06 [PTadmin] Official Update 2022-02
// 
// 
// 0 // Bottom surface
// 1 16 0 -0.25 0 1 0 0 0 -1 0 0 0 1 s\13710ks02.dat
  [1,16,0,-0.25,0,1,0,0,0,-1,0,0,0,1, ldraw_lib__s__13710ks02(realsolid)],
// 0 // Edge surface
// 4 16 33.845 0 16.459 33.105 0 16.725 33.105 -0.25 16.725 33.845 -0.25 16.459
  [4,16,33.845,0,16.459,33.105,0,16.725,33.105,-0.25,16.725,33.845,-0.25,16.459],
// 4 16 33.105 0 16.725 -17.236 0 16.721 -17.236 -0.25 16.721 33.105 -0.25 16.725
  [4,16,33.105,0,16.725,-17.236,0,16.721,-17.236,-0.25,16.721,33.105,-0.25,16.725],
// 4 16 -17.236 0 16.721 -18.13 0 16.45 -18.13 -0.25 16.45 -17.236 -0.25 16.721
  [4,16,-17.236,0,16.721,-18.13,0,16.45,-18.13,-0.25,16.45,-17.236,-0.25,16.721],
// 4 16 -18.13 0 16.45 -18.484 0 15.539 -18.484 -0.25 15.539 -18.13 -0.25 16.45
  [4,16,-18.13,0,16.45,-18.484,0,15.539,-18.484,-0.25,15.539,-18.13,-0.25,16.45],
// 4 16 -18.484 0 15.539 -18.484 0 14.5 -18.484 -0.25 14.5 -18.484 -0.25 15.539
  [4,16,-18.484,0,15.539,-18.484,0,14.5,-18.484,-0.25,14.5,-18.484,-0.25,15.539],
// 4 16 -18.484 0 14.5 -18.484 0 3.75 -18.484 -0.25 3.75 -18.484 -0.25 14.5
  [4,16,-18.484,0,14.5,-18.484,0,3.75,-18.484,-0.25,3.75,-18.484,-0.25,14.5],
// 4 16 -18.484 0 3.75 -18.484 0 -10.75 -18.484 -0.25 -10.75 -18.484 -0.25 3.75
  [4,16,-18.484,0,3.75,-18.484,0,-10.75,-18.484,-0.25,-10.75,-18.484,-0.25,3.75],
// 4 16 -18.484 0 -10.75 -18.487 0 -16.058 -18.487 -0.25 -16.058 -18.484 -0.25 -10.75
  [4,16,-18.484,0,-10.75,-18.487,0,-16.058,-18.487,-0.25,-16.058,-18.484,-0.25,-10.75],
// 4 16 -18.487 0 -16.058 -18.14 0 -16.971 -18.14 -0.25 -16.971 -18.487 -0.25 -16.058
  [4,16,-18.487,0,-16.058,-18.14,0,-16.971,-18.14,-0.25,-16.971,-18.487,-0.25,-16.058],
// 4 16 -18.14 0 -16.971 -17.23 0 -17.27 -17.23 -0.25 -17.27 -18.14 -0.25 -16.971
  [4,16,-18.14,0,-16.971,-17.23,0,-17.27,-17.23,-0.25,-17.27,-18.14,-0.25,-16.971],
// 4 16 -17.23 0 -17.27 20.522 0 -17.269 20.522 -0.25 -17.269 -17.23 -0.25 -17.27
  [4,16,-17.23,0,-17.27,20.522,0,-17.269,20.522,-0.25,-17.269,-17.23,-0.25,-17.27],
// 4 16 20.522 0 -17.269 21.61 0 -16.899 21.61 -0.25 -16.899 20.522 -0.25 -17.269
  [4,16,20.522,0,-17.269,21.61,0,-16.899,21.61,-0.25,-16.899,20.522,-0.25,-17.269],
// 4 16 21.61 0 -16.899 22.205 0 -16.121 22.205 -0.25 -16.121 21.61 -0.25 -16.899
  [4,16,21.61,0,-16.899,22.205,0,-16.121,22.205,-0.25,-16.121,21.61,-0.25,-16.899],
// 4 16 22.205 0 -16.121 24.2 0 -10.75 24.2 -0.25 -10.75 22.205 -0.25 -16.121
  [4,16,22.205,0,-16.121,24.2,0,-10.75,24.2,-0.25,-10.75,22.205,-0.25,-16.121],
// 4 16 24.2 0 -10.75 29.6 0 3.75 29.6 -0.25 3.75 24.2 -0.25 -10.75
  [4,16,24.2,0,-10.75,29.6,0,3.75,29.6,-0.25,3.75,24.2,-0.25,-10.75],
// 4 16 29.6 0 3.75 33.6 0 14.5 33.6 -0.25 14.5 29.6 -0.25 3.75
  [4,16,29.6,0,3.75,33.6,0,14.5,33.6,-0.25,14.5,29.6,-0.25,3.75],
// 4 16 33.6 0 14.5 33.94 0 15.604 33.94 -0.25 15.604 33.6 -0.25 14.5
  [4,16,33.6,0,14.5,33.94,0,15.604,33.94,-0.25,15.604,33.6,-0.25,14.5],
// 4 16 33.94 0 15.604 33.845 0 16.459 33.845 -0.25 16.459 33.94 -0.25 15.604
  [4,16,33.94,0,15.604,33.845,0,16.459,33.845,-0.25,16.459,33.94,-0.25,15.604],
// 5 24 33.105 0 16.725 33.105 -0.25 16.725 33.845 0 16.459 -17.236 0 16.721
  [5,24,33.105,0,16.725,33.105,-0.25,16.725,33.845,0,16.459,-17.236,0,16.721],
// 5 24 33.845 -0.25 16.459 33.845 0 16.459 33.105 0 16.725 33.94 0 15.604
  [5,24,33.845,-0.25,16.459,33.845,0,16.459,33.105,0,16.725,33.94,0,15.604],
// 5 24 -17.236 0 16.721 -17.236 -0.25 16.721 33.105 0 16.725 -18.13 0 16.45
  [5,24,-17.236,0,16.721,-17.236,-0.25,16.721,33.105,0,16.725,-18.13,0,16.45],
// 5 24 -18.13 0 16.45 -18.13 -0.25 16.45 -17.236 0 16.721 -18.484 0 15.539
  [5,24,-18.13,0,16.45,-18.13,-0.25,16.45,-17.236,0,16.721,-18.484,0,15.539],
// 5 24 -18.484 0 15.539 -18.484 -0.25 15.539 -18.13 0 16.45 -18.484 0 14.5
  [5,24,-18.484,0,15.539,-18.484,-0.25,15.539,-18.13,0,16.45,-18.484,0,14.5],
// 5 24 -18.487 0 -16.058 -18.487 -0.25 -16.058 -18.484 0 -10.75 -18.14 0 -16.971
  [5,24,-18.487,0,-16.058,-18.487,-0.25,-16.058,-18.484,0,-10.75,-18.14,0,-16.971],
// 5 24 -18.14 0 -16.971 -18.14 -0.25 -16.971 -18.487 0 -16.058 -17.23 0 -17.27
  [5,24,-18.14,0,-16.971,-18.14,-0.25,-16.971,-18.487,0,-16.058,-17.23,0,-17.27],
// 5 24 -17.23 0 -17.27 -17.23 -0.25 -17.27 -18.14 0 -16.971 20.522 0 -17.269
  [5,24,-17.23,0,-17.27,-17.23,-0.25,-17.27,-18.14,0,-16.971,20.522,0,-17.269],
// 5 24 20.522 0 -17.269 20.522 -0.25 -17.269 -17.23 0 -17.27 21.61 0 -16.899
  [5,24,20.522,0,-17.269,20.522,-0.25,-17.269,-17.23,0,-17.27,21.61,0,-16.899],
// 5 24 21.61 0 -16.899 21.61 -0.25 -16.899 20.522 0 -17.269 22.205 0 -16.121
  [5,24,21.61,0,-16.899,21.61,-0.25,-16.899,20.522,0,-17.269,22.205,0,-16.121],
// 5 24 22.205 0 -16.121 22.205 -0.25 -16.121 21.61 0 -16.899 24.2 0 -10.75
  [5,24,22.205,0,-16.121,22.205,-0.25,-16.121,21.61,0,-16.899,24.2,0,-10.75],
// 5 24 33.6 0 14.5 33.6 -0.25 14.5 29.6 0 3.75 33.94 0 15.604
  [5,24,33.6,0,14.5,33.6,-0.25,14.5,29.6,0,3.75,33.94,0,15.604],
// 5 24 33.94 0 15.604 33.94 -0.25 15.604 33.6 0 14.5 33.845 0 16.459
  [5,24,33.94,0,15.604,33.94,-0.25,15.604,33.6,0,14.5,33.845,0,16.459],
];
module ldraw_lib__s__13710ks01(step=0, col=false, unit=2/5, alt=false, line=0.2, solid=!$preview)
    makepoly(ldraw_lib__s__13710ks01(solid), step=step, col=col, unit=unit, alt=alt, line=line, solid=solid);
ldraw_lib__s__13710ks01(line=0.2);
// main file
use <../lib.scad>
use <s/13710ks01.scad>
use <s/13710ks02.scad>
$fa=1; $fs=0.2;
function ldraw_lib__13710k(realsolid=false) = [
// 0 Sticker Mindstorms EV3 #12 for Beam 3 / Fairing Right (Flat) (Needs Work)
// 0 Name: 13710k.dat
// 0 Author: Philippe Hurbain [Philo]
// 0 !LDRAW_ORG Part UPDATE 2022-02
// 0 !LICENSE Licensed under CC BY 2.0 and CC BY 4.0 : see CAreadme.txt
// 
// 0 !HELP To be used with panel 61070
// 
// 0 BFC CERTIFY CCW
  [0,"BFC","CERTIFY"],
  [0,"BFC","CCW"],
// 
// 0 !HISTORY 2022-03-06 [PTadmin] Official Update 2022-02
// 
// 
// 0 // Image file courtesy of the LEGO MINDSTORMS Team
// 0 // Needs Work: Missing more detailed fallback pattern
// 
// 1 16 0 0 0 -1 0 0 0 1 0 0 0 1 s\13710ks01.dat
  [1,16,0,0,0,-1,0,0,0,1,0,0,0,1, ldraw_lib__s__13710ks01(realsolid)],
// 0 !TEXMAP START PLANAR -33.94 10 16.725 18.484 10 16.725 -33.94 10 -17.27 13710k.png
// 0 !: 1 15 0 0 0 -1 0 0 0 1 0 0 0 1 s\13710ks02.dat
// 0 !TEXMAP FALLBACK
// 1 15 0 0 0 -1 0 0 0 1 0 0 0 1 s\13710ks02.dat
  [1,15,0,0,0,-1,0,0,0,1,0,0,0,1, ldraw_lib__s__13710ks02(realsolid)],
// 0 !TEXMAP END
];
module ldraw_lib__13710k(step=0, col=false, unit=2/5, alt=false, line=0.2, solid=!$preview)
    makepoly(ldraw_lib__13710k(solid), step=step, col=col, unit=unit, alt=alt, line=line, solid=solid);
ldraw_lib__13710k(line=0.2);
